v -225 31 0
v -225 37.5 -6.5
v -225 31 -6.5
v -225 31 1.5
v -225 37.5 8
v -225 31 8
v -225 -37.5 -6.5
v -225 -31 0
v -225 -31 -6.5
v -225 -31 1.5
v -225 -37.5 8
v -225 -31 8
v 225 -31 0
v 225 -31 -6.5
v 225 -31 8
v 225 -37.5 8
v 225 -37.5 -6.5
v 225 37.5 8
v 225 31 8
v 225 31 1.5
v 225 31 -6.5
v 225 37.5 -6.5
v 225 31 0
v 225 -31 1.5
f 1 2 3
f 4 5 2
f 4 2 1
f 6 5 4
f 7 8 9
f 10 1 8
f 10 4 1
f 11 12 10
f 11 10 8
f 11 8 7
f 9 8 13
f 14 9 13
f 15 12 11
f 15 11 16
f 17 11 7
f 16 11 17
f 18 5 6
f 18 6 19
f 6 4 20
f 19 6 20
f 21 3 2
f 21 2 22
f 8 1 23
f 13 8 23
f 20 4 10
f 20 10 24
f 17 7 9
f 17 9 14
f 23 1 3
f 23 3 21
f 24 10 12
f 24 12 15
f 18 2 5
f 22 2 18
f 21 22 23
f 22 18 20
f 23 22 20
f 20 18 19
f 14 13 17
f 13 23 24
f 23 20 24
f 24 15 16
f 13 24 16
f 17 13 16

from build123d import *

# Parameters (mm, degrees)
F0_W     = 450
F0_H     = 75
F1_DEPTH = 1.5
F2_W     = 450
F2_H     = 6.5
F3_DEPTH = 6.5
F4_W     = 450
F4_H     = 6.5
F5_DEPTH = 6.5


with BuildPart() as f1:
    # F0 (on Top) → F1 (new body)
    with BuildSketch(Plane.XY):
        Rectangle(F0_W, F0_H)
    extrude(amount=F1_DEPTH)

    # F2 (on face) → F3 (join)
    with BuildSketch(Plane.XY.offset(1.5)):
        with Locations((0, -34.25)):
            Rectangle(F2_W, F2_H)
        with Locations((0, 34.25)):
            Rectangle(F2_W, F2_H)
    extrude(amount=F3_DEPTH)

    # F4 (on face) → F5 (join)
    with BuildSketch(Plane(origin=(0, 0, 0), x_dir=(1, 0, 0), z_dir=(0, 0, -1))):
        with Locations((0, 34.25)):
            Rectangle(F4_W, F4_H)
        with Locations((0, -34.25)):
            Rectangle(F4_W, F4_H)
    extrude(amount=F5_DEPTH)


solid = f1.part
